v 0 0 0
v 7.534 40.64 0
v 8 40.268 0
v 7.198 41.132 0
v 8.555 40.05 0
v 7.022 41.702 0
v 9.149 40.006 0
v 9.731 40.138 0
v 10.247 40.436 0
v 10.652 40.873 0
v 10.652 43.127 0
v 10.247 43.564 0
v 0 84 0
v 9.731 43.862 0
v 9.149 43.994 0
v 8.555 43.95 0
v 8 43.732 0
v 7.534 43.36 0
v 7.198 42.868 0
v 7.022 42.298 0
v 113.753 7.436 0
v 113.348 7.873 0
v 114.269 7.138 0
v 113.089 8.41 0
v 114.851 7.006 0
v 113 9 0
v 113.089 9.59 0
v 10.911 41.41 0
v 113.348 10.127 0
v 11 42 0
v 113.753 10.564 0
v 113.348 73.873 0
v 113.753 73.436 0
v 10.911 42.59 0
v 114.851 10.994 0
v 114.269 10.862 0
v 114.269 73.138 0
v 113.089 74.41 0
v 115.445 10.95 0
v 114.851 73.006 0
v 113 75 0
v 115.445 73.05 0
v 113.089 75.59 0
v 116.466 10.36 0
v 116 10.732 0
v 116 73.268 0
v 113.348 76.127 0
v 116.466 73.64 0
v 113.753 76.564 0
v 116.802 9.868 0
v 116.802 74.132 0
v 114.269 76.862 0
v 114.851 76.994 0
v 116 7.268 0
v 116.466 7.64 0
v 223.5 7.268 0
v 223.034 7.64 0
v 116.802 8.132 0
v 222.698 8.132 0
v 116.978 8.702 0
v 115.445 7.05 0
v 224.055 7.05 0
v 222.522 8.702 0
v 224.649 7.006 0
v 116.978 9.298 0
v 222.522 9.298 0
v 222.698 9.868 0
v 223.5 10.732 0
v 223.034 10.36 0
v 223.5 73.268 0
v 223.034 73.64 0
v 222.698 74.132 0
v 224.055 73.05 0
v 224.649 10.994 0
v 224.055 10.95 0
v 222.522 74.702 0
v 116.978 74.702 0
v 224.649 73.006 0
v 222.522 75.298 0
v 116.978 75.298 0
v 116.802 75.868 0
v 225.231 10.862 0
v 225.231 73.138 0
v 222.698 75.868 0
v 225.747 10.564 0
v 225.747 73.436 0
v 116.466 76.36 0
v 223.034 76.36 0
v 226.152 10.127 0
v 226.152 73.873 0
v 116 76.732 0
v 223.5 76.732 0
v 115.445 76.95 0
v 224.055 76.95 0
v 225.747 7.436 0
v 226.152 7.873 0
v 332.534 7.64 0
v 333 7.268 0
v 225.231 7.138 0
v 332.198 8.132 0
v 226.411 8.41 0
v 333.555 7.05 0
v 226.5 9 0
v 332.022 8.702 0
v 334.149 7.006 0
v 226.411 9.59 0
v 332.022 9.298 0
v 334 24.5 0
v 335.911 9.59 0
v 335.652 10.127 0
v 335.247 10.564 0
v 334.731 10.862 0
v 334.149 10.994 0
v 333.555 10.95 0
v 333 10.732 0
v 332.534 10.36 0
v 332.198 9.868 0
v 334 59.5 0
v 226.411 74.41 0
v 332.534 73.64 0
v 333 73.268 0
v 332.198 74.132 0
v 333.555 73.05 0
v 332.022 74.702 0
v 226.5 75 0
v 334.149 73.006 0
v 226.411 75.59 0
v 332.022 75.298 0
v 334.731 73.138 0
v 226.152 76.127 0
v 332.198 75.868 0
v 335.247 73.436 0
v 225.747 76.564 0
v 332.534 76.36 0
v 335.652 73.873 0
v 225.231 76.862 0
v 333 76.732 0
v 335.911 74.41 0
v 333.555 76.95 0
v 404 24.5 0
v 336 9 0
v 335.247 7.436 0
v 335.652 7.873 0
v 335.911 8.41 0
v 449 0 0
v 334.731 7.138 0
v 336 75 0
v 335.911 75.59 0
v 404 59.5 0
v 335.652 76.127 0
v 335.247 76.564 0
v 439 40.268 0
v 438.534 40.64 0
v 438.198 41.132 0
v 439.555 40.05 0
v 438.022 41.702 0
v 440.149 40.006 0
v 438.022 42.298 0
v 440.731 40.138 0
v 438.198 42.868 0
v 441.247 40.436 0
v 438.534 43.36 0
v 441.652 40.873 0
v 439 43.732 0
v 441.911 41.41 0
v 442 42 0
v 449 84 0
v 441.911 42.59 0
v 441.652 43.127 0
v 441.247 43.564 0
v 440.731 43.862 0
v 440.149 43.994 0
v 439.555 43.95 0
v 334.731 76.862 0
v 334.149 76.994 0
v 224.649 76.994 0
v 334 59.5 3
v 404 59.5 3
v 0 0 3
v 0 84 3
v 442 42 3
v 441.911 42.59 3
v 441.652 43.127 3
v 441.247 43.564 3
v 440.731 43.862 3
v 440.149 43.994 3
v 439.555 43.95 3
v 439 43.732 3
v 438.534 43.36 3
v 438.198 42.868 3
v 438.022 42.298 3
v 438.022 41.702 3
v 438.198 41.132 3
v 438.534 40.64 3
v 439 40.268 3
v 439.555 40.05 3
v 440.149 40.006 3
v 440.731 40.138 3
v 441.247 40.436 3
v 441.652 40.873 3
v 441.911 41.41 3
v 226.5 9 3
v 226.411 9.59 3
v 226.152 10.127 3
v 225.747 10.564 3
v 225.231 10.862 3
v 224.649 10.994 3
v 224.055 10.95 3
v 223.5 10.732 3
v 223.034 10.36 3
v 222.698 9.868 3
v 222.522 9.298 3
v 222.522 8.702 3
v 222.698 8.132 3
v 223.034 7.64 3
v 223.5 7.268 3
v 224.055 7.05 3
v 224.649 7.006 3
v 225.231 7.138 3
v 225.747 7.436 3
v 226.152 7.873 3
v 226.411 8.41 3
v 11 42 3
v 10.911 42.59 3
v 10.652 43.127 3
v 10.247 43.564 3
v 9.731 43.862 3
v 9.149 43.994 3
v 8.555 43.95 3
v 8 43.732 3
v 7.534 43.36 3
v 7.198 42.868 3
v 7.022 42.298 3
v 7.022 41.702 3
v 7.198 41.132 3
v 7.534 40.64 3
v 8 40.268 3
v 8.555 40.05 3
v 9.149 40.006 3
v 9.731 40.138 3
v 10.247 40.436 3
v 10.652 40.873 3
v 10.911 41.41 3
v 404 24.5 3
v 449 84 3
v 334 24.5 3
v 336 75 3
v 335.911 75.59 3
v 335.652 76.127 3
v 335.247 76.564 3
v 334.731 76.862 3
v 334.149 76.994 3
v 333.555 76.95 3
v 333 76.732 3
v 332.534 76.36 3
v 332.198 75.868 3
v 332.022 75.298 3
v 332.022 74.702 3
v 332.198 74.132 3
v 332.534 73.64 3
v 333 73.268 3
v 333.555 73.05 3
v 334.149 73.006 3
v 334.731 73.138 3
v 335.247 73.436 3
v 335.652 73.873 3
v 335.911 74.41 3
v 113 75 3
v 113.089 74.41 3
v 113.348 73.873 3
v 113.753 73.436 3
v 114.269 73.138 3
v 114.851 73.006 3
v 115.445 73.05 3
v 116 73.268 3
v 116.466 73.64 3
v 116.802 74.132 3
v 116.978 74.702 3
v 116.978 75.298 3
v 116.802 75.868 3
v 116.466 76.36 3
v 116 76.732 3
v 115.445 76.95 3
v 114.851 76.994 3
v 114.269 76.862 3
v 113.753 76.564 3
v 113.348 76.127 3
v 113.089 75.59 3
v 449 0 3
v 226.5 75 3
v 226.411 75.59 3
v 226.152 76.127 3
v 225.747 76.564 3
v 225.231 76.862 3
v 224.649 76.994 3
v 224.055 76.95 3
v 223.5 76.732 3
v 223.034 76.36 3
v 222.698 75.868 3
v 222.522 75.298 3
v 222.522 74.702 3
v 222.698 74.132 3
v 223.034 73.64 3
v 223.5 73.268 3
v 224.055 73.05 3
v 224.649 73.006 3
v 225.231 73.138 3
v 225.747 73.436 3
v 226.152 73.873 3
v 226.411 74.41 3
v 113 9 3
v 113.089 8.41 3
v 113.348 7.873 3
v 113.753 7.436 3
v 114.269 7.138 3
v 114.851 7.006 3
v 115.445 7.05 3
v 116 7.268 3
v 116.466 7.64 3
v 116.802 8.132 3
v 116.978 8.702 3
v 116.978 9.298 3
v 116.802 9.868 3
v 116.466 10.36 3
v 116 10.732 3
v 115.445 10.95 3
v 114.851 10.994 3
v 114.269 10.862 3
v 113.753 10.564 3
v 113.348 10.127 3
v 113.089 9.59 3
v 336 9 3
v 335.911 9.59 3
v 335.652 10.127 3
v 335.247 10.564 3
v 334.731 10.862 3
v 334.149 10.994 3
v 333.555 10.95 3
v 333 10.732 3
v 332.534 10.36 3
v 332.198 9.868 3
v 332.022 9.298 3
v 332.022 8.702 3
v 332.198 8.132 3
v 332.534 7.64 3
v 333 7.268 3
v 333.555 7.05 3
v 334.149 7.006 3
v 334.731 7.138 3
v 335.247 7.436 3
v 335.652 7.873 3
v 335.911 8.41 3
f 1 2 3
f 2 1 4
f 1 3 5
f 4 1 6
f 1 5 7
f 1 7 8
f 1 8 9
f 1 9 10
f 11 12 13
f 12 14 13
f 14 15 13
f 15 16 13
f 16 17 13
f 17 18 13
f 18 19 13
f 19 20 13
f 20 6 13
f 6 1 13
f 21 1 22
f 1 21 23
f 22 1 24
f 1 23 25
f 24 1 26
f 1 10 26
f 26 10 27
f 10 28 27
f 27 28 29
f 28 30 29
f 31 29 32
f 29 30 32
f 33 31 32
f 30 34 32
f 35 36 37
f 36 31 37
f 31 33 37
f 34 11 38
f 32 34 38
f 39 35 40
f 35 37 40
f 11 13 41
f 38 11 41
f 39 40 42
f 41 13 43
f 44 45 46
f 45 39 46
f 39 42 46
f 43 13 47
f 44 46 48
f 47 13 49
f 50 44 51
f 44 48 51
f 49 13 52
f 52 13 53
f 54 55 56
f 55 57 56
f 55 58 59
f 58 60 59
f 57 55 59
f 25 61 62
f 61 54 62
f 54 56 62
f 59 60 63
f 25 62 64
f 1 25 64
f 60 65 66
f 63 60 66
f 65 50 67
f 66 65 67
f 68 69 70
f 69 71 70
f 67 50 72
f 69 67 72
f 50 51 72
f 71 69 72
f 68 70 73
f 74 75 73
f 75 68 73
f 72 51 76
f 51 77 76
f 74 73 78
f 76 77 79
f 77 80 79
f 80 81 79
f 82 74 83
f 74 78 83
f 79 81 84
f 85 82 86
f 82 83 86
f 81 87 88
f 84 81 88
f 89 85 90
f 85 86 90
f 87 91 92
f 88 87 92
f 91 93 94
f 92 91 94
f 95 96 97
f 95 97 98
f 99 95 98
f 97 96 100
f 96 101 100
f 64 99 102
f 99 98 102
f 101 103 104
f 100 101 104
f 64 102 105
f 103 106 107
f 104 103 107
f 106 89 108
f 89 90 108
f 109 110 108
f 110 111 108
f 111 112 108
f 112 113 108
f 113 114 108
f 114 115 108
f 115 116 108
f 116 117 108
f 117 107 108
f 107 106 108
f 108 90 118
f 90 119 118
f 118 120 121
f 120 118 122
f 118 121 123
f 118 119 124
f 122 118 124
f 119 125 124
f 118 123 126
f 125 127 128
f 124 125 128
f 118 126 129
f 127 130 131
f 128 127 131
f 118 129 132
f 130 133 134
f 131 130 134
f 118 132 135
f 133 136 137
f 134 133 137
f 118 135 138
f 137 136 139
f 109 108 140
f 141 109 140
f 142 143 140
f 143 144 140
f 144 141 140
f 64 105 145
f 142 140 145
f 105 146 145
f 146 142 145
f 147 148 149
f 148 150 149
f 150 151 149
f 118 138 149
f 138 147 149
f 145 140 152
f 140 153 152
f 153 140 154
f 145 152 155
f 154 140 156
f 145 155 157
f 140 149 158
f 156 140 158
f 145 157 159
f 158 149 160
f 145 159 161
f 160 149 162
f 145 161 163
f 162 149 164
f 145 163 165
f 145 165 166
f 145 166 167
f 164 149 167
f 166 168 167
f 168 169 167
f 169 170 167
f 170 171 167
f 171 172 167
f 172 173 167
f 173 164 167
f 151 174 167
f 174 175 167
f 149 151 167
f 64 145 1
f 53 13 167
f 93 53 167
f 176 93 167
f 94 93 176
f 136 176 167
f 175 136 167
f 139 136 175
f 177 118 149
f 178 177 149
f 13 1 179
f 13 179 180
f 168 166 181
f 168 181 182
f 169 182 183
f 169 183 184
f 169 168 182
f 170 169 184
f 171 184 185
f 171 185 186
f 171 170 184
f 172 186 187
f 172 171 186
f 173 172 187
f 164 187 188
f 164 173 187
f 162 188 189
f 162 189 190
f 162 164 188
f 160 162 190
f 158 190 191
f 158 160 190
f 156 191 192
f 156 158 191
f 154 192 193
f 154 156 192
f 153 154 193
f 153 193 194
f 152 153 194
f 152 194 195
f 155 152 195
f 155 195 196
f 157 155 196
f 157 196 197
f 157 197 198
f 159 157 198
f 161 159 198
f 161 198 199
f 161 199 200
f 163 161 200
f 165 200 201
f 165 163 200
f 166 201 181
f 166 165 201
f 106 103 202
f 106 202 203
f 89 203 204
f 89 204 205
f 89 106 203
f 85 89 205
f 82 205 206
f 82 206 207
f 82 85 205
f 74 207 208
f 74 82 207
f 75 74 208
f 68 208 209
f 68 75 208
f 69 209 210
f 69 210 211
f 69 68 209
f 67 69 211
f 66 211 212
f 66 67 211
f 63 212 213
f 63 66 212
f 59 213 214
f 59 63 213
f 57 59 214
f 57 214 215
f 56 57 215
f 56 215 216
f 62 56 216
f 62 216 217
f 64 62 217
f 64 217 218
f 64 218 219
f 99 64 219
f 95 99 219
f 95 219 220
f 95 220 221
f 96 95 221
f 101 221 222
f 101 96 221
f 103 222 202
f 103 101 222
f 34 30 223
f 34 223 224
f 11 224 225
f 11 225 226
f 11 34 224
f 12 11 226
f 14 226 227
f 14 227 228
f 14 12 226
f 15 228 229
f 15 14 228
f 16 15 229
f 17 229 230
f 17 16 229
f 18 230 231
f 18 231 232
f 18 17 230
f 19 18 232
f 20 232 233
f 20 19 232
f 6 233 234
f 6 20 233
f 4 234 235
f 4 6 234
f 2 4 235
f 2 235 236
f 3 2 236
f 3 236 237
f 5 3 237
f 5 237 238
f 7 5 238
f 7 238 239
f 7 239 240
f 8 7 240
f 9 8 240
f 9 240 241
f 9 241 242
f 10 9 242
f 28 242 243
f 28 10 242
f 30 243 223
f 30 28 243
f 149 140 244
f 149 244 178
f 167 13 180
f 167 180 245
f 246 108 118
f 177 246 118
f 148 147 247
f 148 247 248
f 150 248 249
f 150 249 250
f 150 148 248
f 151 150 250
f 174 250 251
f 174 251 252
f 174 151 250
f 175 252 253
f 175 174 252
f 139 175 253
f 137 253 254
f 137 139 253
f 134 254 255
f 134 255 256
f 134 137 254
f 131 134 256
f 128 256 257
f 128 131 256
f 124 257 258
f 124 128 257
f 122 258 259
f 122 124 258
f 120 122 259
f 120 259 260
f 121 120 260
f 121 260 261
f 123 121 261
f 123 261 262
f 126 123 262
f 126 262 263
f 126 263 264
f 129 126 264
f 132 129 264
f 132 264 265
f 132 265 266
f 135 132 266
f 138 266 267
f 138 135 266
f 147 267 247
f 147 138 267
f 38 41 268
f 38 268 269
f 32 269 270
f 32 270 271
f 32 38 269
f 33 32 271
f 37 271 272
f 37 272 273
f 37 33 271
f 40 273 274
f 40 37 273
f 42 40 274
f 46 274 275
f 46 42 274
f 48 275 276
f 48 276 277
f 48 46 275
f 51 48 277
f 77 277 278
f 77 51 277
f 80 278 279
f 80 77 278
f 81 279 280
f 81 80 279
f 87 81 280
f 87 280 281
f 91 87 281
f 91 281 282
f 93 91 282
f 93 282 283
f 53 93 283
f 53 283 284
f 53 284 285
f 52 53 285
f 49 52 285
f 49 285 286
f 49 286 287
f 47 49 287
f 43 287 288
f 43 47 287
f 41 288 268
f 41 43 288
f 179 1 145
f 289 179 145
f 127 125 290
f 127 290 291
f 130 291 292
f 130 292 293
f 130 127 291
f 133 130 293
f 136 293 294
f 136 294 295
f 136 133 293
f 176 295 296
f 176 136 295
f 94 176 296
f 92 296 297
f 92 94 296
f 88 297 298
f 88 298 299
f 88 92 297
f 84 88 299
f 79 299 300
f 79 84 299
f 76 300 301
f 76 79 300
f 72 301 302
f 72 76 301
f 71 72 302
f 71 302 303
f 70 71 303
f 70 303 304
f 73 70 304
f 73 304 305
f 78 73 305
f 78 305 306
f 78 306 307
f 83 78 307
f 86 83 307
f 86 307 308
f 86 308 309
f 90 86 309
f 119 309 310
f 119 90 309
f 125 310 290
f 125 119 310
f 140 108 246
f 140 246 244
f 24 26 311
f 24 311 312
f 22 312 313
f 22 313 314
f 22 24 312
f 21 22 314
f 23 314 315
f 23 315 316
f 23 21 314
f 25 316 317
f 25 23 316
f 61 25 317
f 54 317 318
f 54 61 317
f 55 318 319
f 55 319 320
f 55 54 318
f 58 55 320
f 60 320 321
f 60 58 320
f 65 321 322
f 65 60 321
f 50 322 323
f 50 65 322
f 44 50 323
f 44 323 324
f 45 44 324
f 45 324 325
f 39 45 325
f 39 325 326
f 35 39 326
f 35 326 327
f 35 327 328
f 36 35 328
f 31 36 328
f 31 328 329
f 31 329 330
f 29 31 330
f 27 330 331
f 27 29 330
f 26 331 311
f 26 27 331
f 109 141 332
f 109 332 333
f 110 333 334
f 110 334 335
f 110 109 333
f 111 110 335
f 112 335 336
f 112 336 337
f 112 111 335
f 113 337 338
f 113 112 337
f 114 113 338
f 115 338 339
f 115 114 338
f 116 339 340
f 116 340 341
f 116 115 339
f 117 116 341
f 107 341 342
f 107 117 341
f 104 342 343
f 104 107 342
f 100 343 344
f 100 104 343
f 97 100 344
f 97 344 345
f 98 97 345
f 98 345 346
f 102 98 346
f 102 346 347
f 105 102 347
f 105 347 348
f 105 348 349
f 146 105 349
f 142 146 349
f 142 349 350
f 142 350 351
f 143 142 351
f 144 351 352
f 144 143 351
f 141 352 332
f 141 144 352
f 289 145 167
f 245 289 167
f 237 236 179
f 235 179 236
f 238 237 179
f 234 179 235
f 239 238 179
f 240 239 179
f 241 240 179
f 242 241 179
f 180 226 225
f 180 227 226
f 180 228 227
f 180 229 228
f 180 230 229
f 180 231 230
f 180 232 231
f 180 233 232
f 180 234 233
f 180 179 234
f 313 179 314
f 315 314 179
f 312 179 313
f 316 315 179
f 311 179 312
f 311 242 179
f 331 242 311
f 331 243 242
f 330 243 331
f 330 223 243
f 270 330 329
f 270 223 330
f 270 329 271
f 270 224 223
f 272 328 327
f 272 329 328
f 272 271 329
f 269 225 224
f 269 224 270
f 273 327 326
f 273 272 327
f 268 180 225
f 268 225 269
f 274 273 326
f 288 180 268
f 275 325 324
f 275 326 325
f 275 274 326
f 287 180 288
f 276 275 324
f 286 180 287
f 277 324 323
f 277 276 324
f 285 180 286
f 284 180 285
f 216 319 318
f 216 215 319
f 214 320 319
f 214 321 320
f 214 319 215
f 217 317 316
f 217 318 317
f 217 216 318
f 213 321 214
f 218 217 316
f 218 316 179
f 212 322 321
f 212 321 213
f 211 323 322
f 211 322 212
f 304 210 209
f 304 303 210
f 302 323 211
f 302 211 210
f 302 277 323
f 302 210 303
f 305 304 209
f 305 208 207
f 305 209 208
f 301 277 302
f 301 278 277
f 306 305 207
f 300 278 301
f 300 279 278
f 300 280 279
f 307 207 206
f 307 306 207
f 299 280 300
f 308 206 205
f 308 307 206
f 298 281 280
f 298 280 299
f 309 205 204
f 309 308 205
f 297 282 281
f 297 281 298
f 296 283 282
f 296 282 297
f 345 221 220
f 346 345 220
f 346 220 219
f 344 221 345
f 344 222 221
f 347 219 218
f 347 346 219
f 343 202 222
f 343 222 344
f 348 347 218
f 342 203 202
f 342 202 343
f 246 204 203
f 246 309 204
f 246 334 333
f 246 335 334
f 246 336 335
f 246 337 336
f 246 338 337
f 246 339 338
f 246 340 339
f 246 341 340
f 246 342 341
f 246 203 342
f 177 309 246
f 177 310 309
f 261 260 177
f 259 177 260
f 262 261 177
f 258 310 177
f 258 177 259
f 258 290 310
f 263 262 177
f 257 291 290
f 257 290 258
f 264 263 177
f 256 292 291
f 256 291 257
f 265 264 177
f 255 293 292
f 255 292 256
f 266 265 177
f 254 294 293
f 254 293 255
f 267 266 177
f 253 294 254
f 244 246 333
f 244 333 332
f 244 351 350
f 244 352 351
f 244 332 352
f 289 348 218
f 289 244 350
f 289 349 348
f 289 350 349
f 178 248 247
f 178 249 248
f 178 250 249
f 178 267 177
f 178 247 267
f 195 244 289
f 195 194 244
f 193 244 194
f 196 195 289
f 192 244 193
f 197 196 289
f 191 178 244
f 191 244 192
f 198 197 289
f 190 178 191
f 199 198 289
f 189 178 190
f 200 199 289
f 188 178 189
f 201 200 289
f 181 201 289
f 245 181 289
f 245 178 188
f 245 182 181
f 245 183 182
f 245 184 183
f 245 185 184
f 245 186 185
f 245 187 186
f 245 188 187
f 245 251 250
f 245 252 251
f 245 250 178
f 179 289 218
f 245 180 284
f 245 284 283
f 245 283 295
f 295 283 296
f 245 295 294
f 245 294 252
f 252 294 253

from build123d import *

# Parameters (mm, degrees)
SKETCH_F_W                   = 449
SKETCH_F_H                   = 84
SKETCH_F_R                   = 2
SKETCH_F_W_2                 = 70
SKETCH_F_H_2                 = 35
ESTRUSIONE_ESTRUSIONE1_DEPTH = 3


with BuildPart() as part:
    # Sketch f → Estrusione-Estrusione1 (new body)
    with BuildSketch(Plane.XY):
        with Locations((224.5, 42)):
            Rectangle(SKETCH_F_W, SKETCH_F_H)
        with Locations((9, 42)):
            Circle(SKETCH_F_R, mode=Mode.SUBTRACT)
        with Locations((224.5, 75)):
            Circle(SKETCH_F_R, mode=Mode.SUBTRACT)
        with Locations((224.5, 9)):
            Circle(SKETCH_F_R, mode=Mode.SUBTRACT)
        with Locations((440, 42)):
            Circle(SKETCH_F_R, mode=Mode.SUBTRACT)
        with Locations((334, 75)):
            Circle(SKETCH_F_R, mode=Mode.SUBTRACT)
        with Locations((334, 9)):
            Circle(SKETCH_F_R, mode=Mode.SUBTRACT)
        with Locations(Location((115, 9, 0), (0, 0, 180))):
            Circle(SKETCH_F_R, mode=Mode.SUBTRACT)
        with Locations(Location((115, 75, 0), (0, 0, 180))):
            Circle(SKETCH_F_R, mode=Mode.SUBTRACT)
        with Locations((369, 42)):
            Rectangle(SKETCH_F_W_2, SKETCH_F_H_2, mode=Mode.SUBTRACT)
    extrude(amount=ESTRUSIONE_ESTRUSIONE1_DEPTH)


solid = part.part
